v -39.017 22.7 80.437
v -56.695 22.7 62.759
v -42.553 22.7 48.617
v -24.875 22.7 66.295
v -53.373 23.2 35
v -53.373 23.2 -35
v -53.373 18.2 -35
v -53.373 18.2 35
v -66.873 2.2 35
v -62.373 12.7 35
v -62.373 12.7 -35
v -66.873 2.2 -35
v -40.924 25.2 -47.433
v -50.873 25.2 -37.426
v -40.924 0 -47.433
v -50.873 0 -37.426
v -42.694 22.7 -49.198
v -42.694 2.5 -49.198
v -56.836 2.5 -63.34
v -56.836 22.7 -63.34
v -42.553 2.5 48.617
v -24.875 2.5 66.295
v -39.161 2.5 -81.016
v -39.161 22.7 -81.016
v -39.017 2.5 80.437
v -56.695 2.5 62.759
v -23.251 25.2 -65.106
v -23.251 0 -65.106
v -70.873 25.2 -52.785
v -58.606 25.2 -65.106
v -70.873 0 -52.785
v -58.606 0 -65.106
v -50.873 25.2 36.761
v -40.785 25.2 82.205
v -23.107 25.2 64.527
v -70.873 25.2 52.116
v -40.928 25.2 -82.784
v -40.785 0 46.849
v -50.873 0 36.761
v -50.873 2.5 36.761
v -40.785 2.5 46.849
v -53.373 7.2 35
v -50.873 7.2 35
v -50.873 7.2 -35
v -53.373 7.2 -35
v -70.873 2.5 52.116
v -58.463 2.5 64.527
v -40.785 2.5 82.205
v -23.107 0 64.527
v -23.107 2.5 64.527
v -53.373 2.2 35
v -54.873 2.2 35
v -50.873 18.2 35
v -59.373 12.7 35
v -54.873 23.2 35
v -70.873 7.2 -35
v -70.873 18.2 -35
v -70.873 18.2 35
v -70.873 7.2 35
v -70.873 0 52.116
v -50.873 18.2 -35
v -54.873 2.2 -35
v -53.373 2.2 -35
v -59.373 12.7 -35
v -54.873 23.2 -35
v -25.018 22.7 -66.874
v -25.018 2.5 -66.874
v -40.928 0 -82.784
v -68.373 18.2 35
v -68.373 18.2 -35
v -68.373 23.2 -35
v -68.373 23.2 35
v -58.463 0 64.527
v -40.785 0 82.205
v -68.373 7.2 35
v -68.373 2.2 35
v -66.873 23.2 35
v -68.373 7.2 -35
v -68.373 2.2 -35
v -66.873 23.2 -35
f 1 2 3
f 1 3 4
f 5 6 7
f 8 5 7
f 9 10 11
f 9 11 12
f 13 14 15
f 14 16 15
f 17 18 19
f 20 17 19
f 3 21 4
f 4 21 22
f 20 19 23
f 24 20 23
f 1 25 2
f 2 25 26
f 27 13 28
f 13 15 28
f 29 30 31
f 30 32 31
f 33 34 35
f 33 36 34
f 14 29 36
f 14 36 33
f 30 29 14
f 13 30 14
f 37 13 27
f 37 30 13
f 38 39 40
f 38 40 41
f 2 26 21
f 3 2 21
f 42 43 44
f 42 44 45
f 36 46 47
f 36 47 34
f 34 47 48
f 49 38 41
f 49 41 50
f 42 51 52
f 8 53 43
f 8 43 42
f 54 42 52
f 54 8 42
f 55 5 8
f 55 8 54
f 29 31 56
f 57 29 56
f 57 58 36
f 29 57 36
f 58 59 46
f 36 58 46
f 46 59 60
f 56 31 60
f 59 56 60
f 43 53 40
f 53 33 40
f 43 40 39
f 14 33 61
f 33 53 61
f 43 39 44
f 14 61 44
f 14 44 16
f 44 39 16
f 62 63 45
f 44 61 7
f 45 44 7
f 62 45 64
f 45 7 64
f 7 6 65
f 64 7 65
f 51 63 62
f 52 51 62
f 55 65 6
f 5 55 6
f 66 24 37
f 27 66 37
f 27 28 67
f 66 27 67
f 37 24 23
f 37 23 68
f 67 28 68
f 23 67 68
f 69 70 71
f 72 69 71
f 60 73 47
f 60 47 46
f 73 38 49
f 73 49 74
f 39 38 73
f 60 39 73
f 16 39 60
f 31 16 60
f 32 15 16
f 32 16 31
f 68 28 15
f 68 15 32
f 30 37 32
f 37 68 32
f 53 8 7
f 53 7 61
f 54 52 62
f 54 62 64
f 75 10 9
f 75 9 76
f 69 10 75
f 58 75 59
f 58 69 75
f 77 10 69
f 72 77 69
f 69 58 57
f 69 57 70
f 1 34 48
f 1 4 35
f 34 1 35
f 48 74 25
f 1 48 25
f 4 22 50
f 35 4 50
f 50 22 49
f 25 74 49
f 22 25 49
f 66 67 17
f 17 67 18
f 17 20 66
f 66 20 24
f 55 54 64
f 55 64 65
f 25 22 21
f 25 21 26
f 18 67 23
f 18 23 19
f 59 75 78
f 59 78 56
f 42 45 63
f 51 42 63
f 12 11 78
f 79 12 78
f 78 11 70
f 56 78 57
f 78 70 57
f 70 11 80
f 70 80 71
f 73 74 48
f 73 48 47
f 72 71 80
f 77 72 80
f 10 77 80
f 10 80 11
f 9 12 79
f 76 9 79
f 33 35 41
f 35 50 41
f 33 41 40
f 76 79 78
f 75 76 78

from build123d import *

# Parameters (mm, degrees)
EXTRUDE_1_DEPTH          = 2.5
EXTRUDE_2_DEPTH          = 20.2
EXTRUDE_3_DEPTH          = 2.5
CUT_EXTRUDE_1_DEPTH      = 35
CUT_EXTRUDE_1_DEPTH_BACK = 35


with BuildPart() as part:
    # 스케치1 → 보스-돌출1 (new body)
    with BuildSketch(Plane(origin=(0, 0, 0), x_dir=(1, 0, 0), z_dir=(0, 1, 0))):
        Polygon((-40.78505036, -82.204604484), (-58.462719889, -64.526934954), (-70.873239565, -52.116415278), (-70.873239565, 52.78521642), (-58.606071899, 65.106091447), (-40.92840237, 82.783760977), (-23.25073284, 65.106091447), (-40.92391218, 47.432912107), (-50.873239565, 37.425795029), (-50.873239565, -36.761076219), (-40.78505036, -46.849265425), (-23.10738083, -64.526934954), align=None)
    extrude(amount=EXTRUDE_1_DEPTH)

    # 스케치2 → 보스-돌출2 (add)
    with BuildSketch(Plane(origin=(0, 2.5, 0), x_dir=(1, 0, 0), z_dir=(0, 1, 0))):
        Polygon((-25.018499793, 66.8738584), (-42.694238669, 49.198119524), (-56.836374293, 63.340255148), (-39.160635417, 81.015994024), (-40.92840237, 82.783760977), (-58.606071899, 65.106091447), (-70.873239565, 52.78521642), (-70.873239565, -52.116415278), (-40.78505036, -82.204604484), (-39.017283407, -80.436837531), (-56.694952937, -62.759168001), (-42.552817313, -48.617032378), (-24.875147783, -66.294701907), (-23.10738083, -64.526934954), (-50.873239565, -36.761076219), (-50.873239565, 37.425795029), (-40.92391218, 47.432912107), (-23.25073284, 65.106091447), align=None)
    extrude(amount=EXTRUDE_2_DEPTH)

    # 스케치3 → 보스-돌출3 (add)
    with BuildSketch(Plane(origin=(0, 22.7, 0), x_dir=(1, 0, 0), z_dir=(0, 1, 0))):
        Polygon((-40.78505036, -82.204604484), (-23.10738083, -64.526934954), (-50.873239565, -36.761076219), (-50.873239565, 37.425795029), (-40.92391218, 47.432912107), (-23.25073284, 65.106091447), (-40.92840237, 82.783760977), (-58.606071899, 65.106091447), (-70.873239565, 52.78521642), (-70.873239565, -52.116415278), align=None)
    extrude(amount=EXTRUDE_3_DEPTH)

    # 스케치4 → 컷-돌출1 (cut, two sides: drawn at the far end of the back side and taken through both)
    with BuildSketch(Plane.XY.offset(-CUT_EXTRUDE_1_DEPTH_BACK)):
        Polygon((-50.873239565, 18.2), (-50.873239565, 16.507811734), (-50.873239565, 8.892188266), (-50.873239565, 7.2), (-53.373239565, 7.2), (-53.373239565, 2.2), (-54.873239565, 2.2), (-59.373239565, 12.7), (-54.873239565, 23.2), (-53.373239565, 23.2), (-53.373239565, 18.2), align=None)
        Polygon((-70.873239565, 18.2), (-68.373239565, 18.2), (-68.373239565, 23.2), (-66.873239565, 23.2), (-62.373239565, 12.7), (-66.873239565, 2.2), (-68.373239565, 2.2), (-68.373239565, 7.2), (-70.873239565, 7.2), align=None)
    extrude(amount=CUT_EXTRUDE_1_DEPTH + CUT_EXTRUDE_1_DEPTH_BACK, mode=Mode.SUBTRACT)


solid = part.part
